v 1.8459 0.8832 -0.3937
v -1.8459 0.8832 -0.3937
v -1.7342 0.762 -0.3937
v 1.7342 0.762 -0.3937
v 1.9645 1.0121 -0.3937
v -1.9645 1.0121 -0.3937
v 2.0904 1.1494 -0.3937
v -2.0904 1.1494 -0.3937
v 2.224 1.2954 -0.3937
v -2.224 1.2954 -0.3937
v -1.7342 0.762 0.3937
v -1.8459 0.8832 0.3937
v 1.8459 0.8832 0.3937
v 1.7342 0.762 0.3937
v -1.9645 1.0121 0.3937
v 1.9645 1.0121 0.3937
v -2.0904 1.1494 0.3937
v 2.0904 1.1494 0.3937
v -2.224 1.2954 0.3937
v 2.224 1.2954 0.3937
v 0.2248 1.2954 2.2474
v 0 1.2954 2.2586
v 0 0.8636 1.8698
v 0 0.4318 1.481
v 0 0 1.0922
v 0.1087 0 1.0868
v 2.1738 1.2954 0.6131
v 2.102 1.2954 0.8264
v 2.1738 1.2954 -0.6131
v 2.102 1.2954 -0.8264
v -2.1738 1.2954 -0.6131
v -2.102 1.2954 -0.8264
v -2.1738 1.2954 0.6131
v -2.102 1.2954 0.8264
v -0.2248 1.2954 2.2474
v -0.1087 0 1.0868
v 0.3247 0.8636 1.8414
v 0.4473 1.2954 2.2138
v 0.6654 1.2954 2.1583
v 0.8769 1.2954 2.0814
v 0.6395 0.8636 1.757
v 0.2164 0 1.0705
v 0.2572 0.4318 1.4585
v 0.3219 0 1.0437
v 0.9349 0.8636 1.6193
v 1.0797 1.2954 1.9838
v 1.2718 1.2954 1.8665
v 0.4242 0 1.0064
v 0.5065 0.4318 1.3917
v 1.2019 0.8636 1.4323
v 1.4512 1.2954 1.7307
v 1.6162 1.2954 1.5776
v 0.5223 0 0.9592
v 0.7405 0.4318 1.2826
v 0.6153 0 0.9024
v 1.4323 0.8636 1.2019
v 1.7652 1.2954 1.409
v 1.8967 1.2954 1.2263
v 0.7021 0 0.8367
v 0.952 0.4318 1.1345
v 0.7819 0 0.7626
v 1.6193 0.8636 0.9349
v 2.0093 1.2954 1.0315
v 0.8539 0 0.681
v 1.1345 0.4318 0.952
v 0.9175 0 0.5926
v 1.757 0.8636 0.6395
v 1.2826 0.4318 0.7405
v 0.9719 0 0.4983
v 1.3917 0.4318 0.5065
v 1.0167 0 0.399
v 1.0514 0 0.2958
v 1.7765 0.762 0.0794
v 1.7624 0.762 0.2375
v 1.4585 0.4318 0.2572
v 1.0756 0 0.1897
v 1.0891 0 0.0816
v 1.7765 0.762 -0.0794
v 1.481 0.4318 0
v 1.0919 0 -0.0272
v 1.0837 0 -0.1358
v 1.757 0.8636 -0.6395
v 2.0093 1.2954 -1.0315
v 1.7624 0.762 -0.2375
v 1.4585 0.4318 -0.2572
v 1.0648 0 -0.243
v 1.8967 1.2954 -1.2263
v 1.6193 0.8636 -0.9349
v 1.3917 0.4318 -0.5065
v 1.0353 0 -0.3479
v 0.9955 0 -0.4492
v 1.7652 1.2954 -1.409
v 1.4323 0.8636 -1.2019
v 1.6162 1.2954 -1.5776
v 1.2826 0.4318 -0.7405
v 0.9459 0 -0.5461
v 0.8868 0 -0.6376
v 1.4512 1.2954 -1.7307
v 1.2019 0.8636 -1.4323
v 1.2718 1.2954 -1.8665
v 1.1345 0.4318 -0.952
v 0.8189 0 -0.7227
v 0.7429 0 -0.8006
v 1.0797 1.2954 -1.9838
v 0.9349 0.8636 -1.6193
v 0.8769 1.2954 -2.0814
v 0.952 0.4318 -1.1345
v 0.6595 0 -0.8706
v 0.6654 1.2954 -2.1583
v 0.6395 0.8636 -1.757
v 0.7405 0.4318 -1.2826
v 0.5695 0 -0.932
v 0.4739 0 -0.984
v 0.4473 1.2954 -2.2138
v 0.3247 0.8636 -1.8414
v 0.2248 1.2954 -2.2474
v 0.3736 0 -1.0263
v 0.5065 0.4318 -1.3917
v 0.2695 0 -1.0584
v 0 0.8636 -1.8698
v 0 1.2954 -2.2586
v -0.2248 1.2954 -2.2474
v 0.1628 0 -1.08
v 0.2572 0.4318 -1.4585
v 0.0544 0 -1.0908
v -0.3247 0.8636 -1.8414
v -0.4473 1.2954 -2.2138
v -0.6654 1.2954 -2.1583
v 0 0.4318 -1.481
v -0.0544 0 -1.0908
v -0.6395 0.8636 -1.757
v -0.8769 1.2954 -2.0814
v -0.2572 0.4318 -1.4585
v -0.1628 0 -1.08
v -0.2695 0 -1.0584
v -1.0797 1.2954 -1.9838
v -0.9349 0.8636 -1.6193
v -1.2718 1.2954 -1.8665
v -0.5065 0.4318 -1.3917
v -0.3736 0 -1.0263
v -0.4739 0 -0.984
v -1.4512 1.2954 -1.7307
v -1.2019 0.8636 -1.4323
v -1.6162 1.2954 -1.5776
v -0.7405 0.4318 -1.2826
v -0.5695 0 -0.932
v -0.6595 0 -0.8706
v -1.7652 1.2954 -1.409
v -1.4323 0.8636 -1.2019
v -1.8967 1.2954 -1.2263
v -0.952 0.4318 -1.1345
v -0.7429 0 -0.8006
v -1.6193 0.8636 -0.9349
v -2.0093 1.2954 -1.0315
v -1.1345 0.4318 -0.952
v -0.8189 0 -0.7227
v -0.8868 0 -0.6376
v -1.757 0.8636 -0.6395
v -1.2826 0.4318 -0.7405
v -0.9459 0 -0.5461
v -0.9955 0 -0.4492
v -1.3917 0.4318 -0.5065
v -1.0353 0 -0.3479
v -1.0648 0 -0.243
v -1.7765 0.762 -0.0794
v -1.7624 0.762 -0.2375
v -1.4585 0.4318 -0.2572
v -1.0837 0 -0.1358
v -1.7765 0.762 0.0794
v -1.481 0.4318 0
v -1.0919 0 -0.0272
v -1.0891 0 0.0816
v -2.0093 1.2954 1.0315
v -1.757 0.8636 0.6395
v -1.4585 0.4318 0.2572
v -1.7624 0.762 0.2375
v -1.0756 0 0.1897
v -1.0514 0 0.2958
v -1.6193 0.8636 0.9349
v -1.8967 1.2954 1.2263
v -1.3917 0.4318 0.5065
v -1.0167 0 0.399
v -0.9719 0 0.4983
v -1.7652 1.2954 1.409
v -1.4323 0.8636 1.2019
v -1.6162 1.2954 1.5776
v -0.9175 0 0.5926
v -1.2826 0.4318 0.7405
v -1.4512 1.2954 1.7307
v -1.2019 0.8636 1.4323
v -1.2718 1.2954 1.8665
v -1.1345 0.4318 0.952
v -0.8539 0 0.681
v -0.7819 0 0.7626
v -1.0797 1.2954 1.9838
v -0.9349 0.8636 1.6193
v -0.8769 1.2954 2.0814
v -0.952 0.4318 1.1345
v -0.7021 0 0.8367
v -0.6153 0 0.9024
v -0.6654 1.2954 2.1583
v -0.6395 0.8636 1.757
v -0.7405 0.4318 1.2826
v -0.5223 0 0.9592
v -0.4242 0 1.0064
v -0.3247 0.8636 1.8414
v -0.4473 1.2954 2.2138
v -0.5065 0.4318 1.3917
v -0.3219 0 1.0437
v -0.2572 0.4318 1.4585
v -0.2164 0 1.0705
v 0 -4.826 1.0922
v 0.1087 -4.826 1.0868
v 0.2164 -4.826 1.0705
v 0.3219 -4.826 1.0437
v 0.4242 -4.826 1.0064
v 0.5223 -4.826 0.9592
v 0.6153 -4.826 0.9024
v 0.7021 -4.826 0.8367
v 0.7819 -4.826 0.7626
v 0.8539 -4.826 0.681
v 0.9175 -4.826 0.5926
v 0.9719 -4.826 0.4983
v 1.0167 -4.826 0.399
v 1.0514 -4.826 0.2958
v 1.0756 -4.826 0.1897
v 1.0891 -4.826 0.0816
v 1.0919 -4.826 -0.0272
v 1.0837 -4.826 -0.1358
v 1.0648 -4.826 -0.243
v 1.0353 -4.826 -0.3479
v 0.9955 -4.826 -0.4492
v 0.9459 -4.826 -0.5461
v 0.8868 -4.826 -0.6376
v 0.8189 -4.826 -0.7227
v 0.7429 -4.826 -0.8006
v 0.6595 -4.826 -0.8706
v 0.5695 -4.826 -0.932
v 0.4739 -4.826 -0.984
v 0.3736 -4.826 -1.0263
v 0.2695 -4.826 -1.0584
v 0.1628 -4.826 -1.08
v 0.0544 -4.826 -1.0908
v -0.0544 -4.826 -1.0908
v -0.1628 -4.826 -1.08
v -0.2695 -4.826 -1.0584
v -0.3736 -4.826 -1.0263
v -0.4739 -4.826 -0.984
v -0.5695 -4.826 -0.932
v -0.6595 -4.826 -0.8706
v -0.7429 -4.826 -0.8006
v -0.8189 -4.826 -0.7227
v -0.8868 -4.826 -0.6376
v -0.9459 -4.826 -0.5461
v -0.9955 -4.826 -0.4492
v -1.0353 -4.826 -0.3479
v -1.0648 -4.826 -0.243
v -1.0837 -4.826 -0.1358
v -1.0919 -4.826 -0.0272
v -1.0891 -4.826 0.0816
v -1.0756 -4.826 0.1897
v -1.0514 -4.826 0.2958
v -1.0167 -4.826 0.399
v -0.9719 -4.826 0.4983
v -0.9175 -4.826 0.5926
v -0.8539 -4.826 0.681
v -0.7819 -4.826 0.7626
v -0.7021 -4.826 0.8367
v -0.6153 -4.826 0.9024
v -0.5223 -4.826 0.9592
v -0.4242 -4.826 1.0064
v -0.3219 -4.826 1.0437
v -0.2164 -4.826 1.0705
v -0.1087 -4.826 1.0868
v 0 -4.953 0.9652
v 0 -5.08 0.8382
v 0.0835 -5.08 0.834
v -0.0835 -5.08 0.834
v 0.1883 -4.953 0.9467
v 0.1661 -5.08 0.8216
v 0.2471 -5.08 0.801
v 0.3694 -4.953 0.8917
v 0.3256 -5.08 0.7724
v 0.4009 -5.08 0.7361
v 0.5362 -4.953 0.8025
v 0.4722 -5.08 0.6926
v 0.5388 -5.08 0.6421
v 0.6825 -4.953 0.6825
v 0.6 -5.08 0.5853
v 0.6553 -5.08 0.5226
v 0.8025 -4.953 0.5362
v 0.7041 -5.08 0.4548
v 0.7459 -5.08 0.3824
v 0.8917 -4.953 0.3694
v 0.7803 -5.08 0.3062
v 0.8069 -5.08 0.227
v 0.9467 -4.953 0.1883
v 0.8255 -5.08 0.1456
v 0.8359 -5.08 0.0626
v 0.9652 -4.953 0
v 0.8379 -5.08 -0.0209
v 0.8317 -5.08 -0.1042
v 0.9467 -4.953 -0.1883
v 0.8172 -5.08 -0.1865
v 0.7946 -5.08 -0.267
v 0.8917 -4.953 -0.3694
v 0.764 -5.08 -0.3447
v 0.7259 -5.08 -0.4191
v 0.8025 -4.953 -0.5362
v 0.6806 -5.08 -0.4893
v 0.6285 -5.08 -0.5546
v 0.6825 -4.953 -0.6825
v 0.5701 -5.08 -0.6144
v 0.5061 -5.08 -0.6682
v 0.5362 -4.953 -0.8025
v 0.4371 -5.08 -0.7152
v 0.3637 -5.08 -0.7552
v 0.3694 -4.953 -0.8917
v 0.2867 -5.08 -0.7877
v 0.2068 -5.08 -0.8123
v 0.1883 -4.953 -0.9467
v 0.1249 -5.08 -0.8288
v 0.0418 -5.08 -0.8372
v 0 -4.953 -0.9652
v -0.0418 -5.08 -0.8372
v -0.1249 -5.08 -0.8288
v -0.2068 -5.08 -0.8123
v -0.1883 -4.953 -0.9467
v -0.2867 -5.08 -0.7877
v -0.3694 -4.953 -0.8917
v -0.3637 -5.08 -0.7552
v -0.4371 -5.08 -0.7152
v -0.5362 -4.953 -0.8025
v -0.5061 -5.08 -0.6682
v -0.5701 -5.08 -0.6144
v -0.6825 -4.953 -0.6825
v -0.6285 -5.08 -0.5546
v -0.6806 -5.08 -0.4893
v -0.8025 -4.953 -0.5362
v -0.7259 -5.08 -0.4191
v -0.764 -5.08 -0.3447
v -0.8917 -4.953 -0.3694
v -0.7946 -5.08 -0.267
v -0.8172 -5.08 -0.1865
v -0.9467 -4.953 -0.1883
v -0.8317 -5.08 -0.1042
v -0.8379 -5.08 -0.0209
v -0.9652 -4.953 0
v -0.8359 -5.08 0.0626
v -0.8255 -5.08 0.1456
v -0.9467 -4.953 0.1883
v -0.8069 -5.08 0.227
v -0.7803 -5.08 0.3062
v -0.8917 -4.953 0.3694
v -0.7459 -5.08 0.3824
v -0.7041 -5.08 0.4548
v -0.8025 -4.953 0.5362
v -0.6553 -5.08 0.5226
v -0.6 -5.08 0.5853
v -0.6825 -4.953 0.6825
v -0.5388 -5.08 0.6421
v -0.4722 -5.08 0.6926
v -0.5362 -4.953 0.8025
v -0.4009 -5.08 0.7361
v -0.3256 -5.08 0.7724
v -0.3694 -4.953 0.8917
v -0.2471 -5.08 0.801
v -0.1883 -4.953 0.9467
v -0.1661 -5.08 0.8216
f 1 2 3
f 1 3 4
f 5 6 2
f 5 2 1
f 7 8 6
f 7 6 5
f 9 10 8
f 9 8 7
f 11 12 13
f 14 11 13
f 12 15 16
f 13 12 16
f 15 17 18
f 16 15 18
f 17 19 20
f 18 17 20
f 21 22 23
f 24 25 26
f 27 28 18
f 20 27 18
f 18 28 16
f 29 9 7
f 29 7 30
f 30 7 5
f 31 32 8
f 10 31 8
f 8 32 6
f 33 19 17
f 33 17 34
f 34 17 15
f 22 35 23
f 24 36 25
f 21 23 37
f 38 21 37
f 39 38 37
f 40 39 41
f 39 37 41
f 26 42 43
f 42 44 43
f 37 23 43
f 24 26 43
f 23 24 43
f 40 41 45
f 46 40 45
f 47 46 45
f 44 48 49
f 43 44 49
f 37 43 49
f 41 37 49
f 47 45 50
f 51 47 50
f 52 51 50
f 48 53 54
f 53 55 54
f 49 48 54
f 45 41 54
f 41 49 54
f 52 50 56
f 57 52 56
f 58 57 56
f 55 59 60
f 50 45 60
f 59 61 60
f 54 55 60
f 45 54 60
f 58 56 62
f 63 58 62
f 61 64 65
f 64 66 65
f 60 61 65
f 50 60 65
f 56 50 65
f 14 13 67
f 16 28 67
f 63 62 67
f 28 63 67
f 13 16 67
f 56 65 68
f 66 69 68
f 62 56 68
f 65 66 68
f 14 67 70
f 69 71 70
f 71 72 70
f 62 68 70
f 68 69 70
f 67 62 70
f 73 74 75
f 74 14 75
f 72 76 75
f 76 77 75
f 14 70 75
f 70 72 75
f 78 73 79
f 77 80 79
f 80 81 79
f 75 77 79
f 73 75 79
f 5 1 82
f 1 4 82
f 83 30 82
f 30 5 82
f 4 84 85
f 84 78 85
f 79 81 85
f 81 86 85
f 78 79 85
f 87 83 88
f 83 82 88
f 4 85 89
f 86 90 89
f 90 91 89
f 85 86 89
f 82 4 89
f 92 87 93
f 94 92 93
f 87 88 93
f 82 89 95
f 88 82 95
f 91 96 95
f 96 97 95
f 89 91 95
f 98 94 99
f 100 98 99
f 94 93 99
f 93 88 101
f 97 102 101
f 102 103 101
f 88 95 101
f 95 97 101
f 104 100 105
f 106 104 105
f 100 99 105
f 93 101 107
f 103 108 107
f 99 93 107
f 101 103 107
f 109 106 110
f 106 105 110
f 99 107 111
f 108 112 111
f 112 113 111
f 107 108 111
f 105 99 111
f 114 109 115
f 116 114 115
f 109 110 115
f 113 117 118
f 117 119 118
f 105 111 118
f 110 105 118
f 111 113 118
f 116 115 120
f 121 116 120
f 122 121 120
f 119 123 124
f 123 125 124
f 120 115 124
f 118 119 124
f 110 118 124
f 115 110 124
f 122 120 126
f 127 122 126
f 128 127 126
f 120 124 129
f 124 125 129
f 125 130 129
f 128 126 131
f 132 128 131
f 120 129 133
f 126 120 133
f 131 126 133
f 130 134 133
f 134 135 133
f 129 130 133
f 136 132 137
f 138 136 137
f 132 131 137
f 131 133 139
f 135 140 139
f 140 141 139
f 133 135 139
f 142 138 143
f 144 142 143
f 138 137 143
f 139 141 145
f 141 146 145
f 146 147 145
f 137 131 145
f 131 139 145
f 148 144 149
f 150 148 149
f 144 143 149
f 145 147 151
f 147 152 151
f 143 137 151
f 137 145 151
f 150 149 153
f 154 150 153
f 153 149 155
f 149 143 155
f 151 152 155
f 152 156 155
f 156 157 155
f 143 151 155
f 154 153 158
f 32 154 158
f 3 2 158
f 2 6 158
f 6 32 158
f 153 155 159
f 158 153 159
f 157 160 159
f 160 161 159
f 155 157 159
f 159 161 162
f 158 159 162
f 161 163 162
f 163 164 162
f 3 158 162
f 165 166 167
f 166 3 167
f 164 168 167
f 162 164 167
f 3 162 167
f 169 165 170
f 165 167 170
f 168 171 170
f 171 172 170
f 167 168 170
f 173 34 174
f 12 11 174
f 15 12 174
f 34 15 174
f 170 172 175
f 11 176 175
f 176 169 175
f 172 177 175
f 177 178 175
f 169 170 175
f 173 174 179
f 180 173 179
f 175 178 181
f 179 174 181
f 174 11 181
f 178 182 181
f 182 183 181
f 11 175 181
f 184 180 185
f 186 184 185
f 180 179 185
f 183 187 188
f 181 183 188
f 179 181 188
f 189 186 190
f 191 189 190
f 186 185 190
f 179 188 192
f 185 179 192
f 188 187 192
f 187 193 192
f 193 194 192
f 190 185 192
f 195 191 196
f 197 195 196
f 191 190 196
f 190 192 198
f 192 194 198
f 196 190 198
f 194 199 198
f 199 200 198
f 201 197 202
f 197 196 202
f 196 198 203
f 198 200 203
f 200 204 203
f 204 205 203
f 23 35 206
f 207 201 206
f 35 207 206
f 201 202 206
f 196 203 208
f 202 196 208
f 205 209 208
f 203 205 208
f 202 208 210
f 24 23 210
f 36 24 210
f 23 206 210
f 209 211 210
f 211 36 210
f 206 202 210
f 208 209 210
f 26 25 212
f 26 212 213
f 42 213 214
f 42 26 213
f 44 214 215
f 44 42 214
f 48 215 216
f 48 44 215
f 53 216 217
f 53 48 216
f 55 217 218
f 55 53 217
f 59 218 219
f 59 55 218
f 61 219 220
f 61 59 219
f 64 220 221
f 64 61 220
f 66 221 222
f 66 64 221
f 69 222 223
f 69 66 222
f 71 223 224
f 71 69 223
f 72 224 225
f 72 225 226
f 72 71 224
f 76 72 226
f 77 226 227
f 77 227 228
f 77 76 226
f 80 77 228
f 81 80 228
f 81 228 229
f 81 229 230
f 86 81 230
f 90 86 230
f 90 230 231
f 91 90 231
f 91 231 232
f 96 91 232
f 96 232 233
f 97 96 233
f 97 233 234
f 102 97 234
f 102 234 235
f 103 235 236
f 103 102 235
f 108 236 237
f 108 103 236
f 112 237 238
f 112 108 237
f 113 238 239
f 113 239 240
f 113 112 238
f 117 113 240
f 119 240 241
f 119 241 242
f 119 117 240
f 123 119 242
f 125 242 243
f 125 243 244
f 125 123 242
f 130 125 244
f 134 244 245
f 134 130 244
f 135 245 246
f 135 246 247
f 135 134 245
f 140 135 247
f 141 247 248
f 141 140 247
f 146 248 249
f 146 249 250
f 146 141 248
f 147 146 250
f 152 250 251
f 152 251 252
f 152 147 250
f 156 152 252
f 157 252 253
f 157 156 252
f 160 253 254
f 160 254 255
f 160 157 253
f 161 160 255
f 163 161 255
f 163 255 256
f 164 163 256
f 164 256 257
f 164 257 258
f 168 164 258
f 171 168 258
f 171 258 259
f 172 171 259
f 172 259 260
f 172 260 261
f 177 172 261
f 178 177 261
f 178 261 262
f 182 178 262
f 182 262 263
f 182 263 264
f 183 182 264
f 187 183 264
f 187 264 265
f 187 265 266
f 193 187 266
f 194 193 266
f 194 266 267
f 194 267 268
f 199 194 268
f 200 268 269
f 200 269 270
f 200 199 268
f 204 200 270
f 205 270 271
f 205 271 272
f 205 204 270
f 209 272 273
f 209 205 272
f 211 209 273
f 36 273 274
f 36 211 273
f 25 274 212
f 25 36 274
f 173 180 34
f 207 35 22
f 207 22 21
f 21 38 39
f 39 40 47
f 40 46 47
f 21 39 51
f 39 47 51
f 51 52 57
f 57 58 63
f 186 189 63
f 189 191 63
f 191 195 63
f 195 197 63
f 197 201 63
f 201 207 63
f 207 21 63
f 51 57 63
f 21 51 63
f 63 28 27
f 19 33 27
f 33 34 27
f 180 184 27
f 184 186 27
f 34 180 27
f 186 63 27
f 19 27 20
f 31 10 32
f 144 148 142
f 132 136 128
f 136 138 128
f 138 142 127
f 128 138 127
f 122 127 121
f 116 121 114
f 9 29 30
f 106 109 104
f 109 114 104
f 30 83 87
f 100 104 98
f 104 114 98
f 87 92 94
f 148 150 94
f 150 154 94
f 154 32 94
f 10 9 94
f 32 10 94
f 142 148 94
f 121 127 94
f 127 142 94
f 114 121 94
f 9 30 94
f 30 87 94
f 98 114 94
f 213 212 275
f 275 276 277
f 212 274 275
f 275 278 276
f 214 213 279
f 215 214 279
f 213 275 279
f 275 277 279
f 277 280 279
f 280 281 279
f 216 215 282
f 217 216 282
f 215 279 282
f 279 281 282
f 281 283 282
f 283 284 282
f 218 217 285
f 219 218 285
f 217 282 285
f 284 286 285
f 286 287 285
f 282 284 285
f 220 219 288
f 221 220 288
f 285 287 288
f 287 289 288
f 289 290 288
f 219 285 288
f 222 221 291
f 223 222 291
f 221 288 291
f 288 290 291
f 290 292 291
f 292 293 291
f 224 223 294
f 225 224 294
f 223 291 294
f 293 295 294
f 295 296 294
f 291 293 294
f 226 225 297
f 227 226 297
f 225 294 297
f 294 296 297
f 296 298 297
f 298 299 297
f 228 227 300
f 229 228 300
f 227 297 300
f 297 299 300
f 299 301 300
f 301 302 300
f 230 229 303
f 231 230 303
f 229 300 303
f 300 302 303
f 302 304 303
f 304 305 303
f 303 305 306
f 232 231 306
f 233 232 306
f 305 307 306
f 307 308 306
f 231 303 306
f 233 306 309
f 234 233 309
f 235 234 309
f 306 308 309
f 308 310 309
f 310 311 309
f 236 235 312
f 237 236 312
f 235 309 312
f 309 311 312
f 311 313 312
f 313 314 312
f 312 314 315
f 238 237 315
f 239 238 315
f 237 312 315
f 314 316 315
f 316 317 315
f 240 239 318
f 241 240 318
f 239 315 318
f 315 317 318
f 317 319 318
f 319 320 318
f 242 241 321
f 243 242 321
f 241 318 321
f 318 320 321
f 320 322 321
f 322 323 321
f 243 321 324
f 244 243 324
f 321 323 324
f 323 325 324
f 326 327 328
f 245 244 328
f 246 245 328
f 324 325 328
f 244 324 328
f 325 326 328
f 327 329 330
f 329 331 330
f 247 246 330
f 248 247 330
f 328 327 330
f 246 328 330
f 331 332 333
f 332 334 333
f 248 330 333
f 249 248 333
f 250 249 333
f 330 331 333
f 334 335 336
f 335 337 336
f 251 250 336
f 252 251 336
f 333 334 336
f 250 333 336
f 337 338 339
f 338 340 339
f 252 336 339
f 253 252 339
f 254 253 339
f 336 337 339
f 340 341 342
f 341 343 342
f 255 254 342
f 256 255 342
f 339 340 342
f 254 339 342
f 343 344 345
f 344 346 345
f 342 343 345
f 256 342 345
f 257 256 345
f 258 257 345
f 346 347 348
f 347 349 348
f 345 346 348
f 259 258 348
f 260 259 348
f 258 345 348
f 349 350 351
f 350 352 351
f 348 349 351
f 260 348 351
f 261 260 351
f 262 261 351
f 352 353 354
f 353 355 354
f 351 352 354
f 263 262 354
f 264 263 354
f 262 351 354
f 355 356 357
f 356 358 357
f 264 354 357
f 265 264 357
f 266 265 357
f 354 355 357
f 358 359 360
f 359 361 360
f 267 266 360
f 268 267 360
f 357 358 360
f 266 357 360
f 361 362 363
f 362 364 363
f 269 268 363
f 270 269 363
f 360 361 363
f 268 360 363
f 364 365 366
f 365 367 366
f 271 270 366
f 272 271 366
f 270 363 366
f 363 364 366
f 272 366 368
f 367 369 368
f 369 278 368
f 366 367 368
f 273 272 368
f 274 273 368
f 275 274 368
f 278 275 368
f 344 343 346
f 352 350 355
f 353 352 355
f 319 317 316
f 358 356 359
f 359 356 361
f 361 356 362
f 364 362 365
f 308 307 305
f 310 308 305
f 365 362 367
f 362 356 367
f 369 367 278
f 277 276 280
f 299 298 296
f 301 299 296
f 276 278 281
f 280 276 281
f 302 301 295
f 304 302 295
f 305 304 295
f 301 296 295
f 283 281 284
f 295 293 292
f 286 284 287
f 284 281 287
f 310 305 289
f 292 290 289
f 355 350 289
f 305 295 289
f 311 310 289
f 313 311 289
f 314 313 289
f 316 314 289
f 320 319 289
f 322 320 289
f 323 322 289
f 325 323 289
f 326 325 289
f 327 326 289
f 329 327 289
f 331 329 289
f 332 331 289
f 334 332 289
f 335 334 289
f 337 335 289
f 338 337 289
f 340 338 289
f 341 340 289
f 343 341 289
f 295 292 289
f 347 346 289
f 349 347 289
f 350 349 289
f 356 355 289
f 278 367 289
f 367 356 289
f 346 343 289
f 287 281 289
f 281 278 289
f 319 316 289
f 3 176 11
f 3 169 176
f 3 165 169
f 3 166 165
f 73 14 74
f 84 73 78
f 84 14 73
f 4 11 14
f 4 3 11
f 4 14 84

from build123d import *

# Parameters (mm, degrees)
SKETCH1_R     = 1.0922
SHAFT_DEPTH   = 5.08
SKETCH4_W     = 4.517166798
SKETCH4_H     = 0.7874
SLOT_DEPTH    = 0.5334
CHAMFER1_SIZE = 0.254


with BuildPart() as part:
    # Sketch1 → Shaft (new body)
    with BuildSketch(Plane(origin=(0, 0, 0), x_dir=(1, 0, 0), z_dir=(0, 1, 0))):
        with Locations(Location((0, 0, 0), (0, 0, 270))):
            Circle(SKETCH1_R)
    extrude(amount=-SHAFT_DEPTH)

    # Sketch3 → Head (revolve)
    with BuildSketch(Plane.XY, mode=Mode.PRIVATE) as head_sk:
        Polygon((0, 0), (0, 1.2954), (2.258583399, 1.2954), (1.0922, 0), align=None)
    revolve(head_sk.sketch.rotate(Axis((0, 0, 0), (0, 1, 0)), 270), axis=Axis((0, 0, 0), (0, 1, 0)))

    # Sketch4 → Slot (cut)
    with BuildSketch(Plane(origin=(0, 1.2954, 0), x_dir=(1, 0, 0), z_dir=(0, 1, 0))):
        Rectangle(SKETCH4_W, SKETCH4_H)
    extrude(amount=-SLOT_DEPTH, mode=Mode.SUBTRACT)

    # Chamfer1
    chamfer1_edges = [part.edges().sort_by_distance(p)[0] for p in [
        (0, -5.08, -1.0922),
    ]]
    chamfer(chamfer1_edges, length=CHAMFER1_SIZE)


solid = part.part
